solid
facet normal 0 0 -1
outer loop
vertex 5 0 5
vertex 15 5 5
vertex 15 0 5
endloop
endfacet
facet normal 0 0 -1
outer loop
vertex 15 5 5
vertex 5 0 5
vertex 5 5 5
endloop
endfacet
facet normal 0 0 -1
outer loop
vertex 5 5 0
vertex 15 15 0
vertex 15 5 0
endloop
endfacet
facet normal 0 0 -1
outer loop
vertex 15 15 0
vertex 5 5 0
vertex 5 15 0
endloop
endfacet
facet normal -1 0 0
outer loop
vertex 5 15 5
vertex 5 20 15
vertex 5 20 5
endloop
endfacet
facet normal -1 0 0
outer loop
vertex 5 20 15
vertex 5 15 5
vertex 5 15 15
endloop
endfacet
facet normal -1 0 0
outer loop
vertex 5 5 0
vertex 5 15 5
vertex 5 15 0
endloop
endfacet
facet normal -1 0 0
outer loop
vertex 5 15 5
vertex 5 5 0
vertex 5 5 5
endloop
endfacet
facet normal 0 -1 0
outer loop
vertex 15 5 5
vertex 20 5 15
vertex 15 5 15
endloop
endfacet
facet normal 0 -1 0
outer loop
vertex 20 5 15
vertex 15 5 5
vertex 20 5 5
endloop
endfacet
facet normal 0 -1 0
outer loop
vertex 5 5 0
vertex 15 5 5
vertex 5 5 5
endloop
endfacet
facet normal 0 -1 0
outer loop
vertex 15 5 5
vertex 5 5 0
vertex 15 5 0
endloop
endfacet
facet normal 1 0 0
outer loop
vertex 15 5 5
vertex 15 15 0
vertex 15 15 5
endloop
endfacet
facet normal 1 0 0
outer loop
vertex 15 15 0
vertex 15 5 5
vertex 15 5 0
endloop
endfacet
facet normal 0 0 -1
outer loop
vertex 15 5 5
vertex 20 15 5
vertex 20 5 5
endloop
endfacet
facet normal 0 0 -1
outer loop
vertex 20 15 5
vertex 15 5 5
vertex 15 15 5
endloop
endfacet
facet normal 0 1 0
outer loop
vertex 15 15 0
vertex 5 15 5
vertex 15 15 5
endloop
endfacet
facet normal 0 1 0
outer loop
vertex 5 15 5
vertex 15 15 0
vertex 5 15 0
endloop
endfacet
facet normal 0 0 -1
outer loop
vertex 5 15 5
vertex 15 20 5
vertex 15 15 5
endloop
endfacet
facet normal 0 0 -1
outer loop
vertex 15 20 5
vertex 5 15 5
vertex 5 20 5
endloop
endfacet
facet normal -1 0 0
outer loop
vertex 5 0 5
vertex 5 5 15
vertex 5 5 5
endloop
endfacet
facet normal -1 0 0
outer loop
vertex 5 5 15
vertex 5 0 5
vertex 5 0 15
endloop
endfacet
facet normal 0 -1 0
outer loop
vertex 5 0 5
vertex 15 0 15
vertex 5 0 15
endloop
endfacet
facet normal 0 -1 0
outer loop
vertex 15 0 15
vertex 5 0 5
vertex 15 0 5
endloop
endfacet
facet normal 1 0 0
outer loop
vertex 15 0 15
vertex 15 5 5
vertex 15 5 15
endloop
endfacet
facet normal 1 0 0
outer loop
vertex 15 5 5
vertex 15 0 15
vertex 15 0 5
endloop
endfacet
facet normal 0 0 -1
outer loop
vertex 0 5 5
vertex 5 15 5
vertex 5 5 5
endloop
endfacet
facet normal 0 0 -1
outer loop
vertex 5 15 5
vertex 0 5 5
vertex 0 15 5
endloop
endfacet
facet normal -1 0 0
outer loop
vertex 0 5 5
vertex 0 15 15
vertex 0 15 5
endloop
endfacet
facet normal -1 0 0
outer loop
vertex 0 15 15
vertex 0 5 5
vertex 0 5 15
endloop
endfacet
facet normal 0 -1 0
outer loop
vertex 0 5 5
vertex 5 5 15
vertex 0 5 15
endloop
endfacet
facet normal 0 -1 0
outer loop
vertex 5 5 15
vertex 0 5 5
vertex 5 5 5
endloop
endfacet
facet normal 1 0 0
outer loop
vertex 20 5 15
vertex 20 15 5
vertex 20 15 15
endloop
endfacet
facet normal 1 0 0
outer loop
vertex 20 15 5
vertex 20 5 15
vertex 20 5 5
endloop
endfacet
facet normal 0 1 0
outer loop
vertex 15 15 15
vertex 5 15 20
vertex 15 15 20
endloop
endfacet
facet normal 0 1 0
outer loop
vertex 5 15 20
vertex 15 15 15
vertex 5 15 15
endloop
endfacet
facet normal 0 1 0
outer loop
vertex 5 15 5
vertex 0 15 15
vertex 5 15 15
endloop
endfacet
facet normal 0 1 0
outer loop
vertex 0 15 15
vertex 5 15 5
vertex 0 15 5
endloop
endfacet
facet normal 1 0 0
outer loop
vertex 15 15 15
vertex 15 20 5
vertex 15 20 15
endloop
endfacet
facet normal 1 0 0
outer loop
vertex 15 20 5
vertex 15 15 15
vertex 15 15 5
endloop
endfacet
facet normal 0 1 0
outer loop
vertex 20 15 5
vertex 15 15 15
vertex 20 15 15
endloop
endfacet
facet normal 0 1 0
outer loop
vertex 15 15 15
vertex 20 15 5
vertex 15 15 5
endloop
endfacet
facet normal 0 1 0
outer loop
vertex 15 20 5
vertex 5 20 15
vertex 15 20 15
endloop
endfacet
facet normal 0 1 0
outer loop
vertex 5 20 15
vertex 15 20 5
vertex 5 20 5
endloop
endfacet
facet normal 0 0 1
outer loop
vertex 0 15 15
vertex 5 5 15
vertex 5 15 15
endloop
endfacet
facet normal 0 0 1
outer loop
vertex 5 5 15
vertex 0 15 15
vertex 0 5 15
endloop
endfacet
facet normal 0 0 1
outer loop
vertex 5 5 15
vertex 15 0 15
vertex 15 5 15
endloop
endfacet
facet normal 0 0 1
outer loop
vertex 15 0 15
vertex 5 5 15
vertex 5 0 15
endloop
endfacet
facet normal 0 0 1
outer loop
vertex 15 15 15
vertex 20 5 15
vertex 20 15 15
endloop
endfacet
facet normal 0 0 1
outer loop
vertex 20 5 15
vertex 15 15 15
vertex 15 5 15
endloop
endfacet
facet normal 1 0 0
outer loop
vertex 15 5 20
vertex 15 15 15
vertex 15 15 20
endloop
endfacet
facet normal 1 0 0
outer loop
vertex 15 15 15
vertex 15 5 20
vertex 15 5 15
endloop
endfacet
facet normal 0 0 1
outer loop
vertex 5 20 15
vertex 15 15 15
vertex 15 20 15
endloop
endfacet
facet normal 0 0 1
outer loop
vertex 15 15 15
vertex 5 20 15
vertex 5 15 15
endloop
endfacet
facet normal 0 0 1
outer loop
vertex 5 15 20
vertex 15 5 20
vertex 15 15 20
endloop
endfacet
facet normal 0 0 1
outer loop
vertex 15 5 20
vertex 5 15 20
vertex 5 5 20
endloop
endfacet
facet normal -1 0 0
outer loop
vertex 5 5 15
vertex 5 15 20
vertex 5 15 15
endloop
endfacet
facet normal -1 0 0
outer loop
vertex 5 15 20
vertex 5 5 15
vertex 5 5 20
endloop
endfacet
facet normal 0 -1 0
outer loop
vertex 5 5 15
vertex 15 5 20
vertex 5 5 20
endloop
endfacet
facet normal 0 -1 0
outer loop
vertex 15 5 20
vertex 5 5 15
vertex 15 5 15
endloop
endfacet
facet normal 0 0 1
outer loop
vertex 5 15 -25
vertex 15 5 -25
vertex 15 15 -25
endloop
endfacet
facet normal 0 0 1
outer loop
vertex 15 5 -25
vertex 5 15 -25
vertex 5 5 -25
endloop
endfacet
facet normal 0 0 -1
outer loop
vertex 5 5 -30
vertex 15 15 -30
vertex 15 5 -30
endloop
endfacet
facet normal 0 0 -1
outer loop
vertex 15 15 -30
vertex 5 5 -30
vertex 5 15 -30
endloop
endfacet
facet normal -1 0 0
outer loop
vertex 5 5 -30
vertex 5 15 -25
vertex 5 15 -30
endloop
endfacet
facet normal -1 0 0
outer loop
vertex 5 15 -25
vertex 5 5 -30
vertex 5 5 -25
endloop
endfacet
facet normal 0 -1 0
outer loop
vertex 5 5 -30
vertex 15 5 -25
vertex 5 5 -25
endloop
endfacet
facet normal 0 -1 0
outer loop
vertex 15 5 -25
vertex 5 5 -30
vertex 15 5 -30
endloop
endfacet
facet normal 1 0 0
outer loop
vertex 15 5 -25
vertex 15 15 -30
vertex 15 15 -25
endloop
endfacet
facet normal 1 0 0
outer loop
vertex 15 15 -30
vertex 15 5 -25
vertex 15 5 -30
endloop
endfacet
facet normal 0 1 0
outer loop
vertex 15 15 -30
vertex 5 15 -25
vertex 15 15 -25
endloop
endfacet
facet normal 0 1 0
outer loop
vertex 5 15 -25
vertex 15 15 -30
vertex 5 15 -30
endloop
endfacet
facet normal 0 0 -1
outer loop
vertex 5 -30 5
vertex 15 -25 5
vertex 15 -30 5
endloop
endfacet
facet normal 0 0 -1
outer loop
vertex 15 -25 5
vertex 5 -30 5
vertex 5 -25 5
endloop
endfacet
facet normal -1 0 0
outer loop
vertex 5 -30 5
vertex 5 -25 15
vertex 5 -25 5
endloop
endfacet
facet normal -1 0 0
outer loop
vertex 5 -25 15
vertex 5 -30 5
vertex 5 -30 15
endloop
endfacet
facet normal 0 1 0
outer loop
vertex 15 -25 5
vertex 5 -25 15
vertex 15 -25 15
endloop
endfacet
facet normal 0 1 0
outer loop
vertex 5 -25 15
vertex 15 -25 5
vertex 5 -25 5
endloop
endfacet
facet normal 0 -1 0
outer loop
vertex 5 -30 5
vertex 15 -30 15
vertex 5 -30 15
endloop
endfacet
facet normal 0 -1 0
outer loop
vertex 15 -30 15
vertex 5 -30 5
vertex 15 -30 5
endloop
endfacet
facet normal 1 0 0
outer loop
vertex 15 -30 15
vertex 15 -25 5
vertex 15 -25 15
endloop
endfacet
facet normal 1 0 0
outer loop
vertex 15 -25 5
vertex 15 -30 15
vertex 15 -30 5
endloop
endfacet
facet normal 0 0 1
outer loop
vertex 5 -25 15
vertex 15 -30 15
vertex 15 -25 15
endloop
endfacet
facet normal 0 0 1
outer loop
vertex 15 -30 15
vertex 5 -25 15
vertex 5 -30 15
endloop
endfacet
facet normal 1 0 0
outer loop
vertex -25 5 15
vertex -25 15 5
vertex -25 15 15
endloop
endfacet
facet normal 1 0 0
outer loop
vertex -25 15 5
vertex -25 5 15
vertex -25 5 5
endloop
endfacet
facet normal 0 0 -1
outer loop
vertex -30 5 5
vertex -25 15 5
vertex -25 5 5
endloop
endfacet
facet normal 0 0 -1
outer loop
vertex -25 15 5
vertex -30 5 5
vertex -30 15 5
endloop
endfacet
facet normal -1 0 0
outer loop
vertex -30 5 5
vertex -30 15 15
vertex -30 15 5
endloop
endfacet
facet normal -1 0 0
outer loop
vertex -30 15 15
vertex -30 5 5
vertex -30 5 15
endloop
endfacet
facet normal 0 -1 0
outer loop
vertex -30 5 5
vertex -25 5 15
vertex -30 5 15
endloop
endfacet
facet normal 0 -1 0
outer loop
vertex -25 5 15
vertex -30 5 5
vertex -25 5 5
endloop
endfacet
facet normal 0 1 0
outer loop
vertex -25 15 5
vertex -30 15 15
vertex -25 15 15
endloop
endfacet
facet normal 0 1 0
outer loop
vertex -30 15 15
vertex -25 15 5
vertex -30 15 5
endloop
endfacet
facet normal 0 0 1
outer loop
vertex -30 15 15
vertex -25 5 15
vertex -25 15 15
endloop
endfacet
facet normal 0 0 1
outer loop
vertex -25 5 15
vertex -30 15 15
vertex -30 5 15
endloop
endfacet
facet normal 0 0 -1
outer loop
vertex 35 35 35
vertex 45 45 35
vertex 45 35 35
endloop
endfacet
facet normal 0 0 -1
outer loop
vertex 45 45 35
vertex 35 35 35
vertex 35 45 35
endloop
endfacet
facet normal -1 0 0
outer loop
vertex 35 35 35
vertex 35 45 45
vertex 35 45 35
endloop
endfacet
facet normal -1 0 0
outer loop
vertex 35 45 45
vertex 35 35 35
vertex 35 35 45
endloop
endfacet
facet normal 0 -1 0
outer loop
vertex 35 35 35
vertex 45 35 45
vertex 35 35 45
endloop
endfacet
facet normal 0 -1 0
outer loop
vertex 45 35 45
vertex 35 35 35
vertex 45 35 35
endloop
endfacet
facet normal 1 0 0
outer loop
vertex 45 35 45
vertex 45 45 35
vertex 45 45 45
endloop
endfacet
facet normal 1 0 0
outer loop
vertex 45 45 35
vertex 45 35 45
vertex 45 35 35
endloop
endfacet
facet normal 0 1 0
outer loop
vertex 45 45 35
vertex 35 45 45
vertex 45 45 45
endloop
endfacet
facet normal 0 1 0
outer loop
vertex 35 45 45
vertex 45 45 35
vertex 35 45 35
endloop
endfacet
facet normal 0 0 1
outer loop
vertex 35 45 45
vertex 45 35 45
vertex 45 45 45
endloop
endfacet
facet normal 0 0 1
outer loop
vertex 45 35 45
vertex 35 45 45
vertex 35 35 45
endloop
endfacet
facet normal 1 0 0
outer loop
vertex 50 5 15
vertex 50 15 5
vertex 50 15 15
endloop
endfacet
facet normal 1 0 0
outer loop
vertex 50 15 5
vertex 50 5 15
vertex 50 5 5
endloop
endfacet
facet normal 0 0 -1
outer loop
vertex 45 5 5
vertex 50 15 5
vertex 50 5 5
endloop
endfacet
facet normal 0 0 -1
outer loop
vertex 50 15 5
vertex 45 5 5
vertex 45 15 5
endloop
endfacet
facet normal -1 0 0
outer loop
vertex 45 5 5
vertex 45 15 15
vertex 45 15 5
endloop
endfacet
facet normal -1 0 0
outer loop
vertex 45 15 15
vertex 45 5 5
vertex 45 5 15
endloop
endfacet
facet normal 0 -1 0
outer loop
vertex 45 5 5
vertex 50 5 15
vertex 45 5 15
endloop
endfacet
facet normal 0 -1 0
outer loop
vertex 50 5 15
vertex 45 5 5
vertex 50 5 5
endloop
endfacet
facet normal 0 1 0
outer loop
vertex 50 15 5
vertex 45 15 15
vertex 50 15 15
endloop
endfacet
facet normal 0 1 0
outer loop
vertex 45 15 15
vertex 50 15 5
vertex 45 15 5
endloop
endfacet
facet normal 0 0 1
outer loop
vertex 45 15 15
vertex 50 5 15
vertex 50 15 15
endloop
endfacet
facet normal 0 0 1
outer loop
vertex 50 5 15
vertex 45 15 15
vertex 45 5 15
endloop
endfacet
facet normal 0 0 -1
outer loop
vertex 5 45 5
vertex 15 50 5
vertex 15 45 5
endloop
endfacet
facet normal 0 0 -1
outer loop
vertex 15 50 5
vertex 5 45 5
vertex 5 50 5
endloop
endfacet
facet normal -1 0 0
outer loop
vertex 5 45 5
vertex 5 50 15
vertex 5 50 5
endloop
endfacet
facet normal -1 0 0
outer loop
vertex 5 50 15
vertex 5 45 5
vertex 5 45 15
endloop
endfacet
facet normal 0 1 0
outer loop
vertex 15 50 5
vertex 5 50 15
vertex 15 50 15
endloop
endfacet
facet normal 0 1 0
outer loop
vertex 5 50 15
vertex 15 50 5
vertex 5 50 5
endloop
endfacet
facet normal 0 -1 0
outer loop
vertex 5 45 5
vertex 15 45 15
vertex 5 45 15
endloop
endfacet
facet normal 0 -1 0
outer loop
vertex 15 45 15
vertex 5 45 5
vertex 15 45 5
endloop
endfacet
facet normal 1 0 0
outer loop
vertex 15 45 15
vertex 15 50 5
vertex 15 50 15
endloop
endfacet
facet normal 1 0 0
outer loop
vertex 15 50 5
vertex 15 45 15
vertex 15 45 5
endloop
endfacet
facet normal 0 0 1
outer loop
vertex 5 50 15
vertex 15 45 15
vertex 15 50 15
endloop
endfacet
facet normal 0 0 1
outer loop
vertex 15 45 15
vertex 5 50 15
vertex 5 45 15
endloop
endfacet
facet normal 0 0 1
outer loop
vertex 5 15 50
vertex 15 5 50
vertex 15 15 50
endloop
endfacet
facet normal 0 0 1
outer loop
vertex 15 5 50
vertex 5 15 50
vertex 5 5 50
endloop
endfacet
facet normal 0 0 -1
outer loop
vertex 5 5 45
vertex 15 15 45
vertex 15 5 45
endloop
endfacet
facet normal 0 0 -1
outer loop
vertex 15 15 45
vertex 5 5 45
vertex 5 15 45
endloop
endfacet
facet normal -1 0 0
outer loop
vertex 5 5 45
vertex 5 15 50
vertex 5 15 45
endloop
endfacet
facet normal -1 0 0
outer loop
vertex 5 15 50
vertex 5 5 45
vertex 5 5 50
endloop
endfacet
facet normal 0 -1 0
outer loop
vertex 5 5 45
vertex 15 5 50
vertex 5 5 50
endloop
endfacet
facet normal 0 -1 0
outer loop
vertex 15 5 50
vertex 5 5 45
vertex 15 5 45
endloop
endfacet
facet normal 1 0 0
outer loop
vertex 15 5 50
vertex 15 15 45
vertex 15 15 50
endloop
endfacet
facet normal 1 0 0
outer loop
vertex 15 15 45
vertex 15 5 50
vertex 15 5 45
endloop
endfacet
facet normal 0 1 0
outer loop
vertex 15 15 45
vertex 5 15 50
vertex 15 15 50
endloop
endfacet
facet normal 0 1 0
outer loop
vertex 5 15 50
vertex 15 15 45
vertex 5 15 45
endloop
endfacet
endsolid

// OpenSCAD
// SCAD file for Six Piece Burr Puzzle
// 整体模型
union() {
  translate([5, 5, 0]) color([1, 0.8, 0, 0.85]) cube([5, 5, 5]);
  translate([10, 5, 0]) color([1, 0.8, 0, 0.85]) cube([5, 5, 5]);
  translate([5, 10, 0]) color([1, 0.8, 0, 0.85]) cube([5, 5, 5]);
  translate([10, 10, 0]) color([1, 0.8, 0, 0.85]) cube([5, 5, 5]);
  translate([5, 0, 5]) color([0, 0.8, 0, 0.85]) cube([5, 5, 5]);
  translate([10, 0, 5]) color([0, 0.8, 0, 0.85]) cube([5, 5, 5]);
  translate([0, 5, 5]) color([0.6, 0, 1, 0.85]) cube([5, 5, 5]);
  translate([5, 5, 5]) color([0.8, 0.8, 0.8, 0.85]) cube([5, 5, 5]);
  translate([10, 5, 5]) color([0.8, 0.8, 0.8, 0.85]) cube([5, 5, 5]);
  translate([15, 5, 5]) color([1, 0.4, 0, 0.85]) cube([5, 5, 5]);
  translate([0, 10, 5]) color([0.6, 0, 1, 0.85]) cube([5, 5, 5]);
  translate([5, 10, 5]) color([0.8, 0.8, 0.8, 0.85]) cube([5, 5, 5]);
  translate([10, 10, 5]) color([0.8, 0.8, 0.8, 0.85]) cube([5, 5, 5]);
  translate([15, 10, 5]) color([1, 0.4, 0, 0.85]) cube([5, 5, 5]);
  translate([5, 15, 5]) color([1, 0, 0, 0.85]) cube([5, 5, 5]);
  translate([10, 15, 5]) color([1, 0, 0, 0.85]) cube([5, 5, 5]);
  translate([5, 0, 10]) color([0, 0.8, 0, 0.85]) cube([5, 5, 5]);
  translate([10, 0, 10]) color([0, 0.8, 0, 0.85]) cube([5, 5, 5]);
  translate([0, 5, 10]) color([0.6, 0, 1, 0.85]) cube([5, 5, 5]);
  translate([5, 5, 10]) color([0.8, 0.8, 0.8, 0.85]) cube([5, 5, 5]);
  translate([10, 5, 10]) color([0.8, 0.8, 0.8, 0.85]) cube([5, 5, 5]);
  translate([15, 5, 10]) color([1, 0.4, 0, 0.85]) cube([5, 5, 5]);
  translate([0, 10, 10]) color([0.6, 0, 1, 0.85]) cube([5, 5, 5]);
  translate([5, 10, 10]) color([0.8, 0.8, 0.8, 0.85]) cube([5, 5, 5]);
  translate([10, 10, 10]) color([0.8, 0.8, 0.8, 0.85]) cube([5, 5, 5]);
  translate([15, 10, 10]) color([1, 0.4, 0, 0.85]) cube([5, 5, 5]);
  translate([5, 15, 10]) color([1, 0, 0, 0.85]) cube([5, 5, 5]);
  translate([10, 15, 10]) color([1, 0, 0, 0.85]) cube([5, 5, 5]);
  translate([5, 5, 15]) color([0, 0.4, 1, 0.85]) cube([5, 5, 5]);
  translate([10, 5, 15]) color([0, 0.4, 1, 0.85]) cube([5, 5, 5]);
  translate([5, 10, 15]) color([0, 0.4, 1, 0.85]) cube([5, 5, 5]);
  translate([10, 10, 15]) color([0, 0.4, 1, 0.85]) cube([5, 5, 5]);
}

// 零件 D
union() {
  translate([5.0, 5.0, -30.0]) color([1, 0.8, 0, 0.85]) cube([5, 5, 5]);
  translate([10.0, 5.0, -30.0]) color([1, 0.8, 0, 0.85]) cube([5, 5, 5]);
  translate([5.0, 10.0, -30.0]) color([1, 0.8, 0, 0.85]) cube([5, 5, 5]);
  translate([10.0, 10.0, -30.0]) color([1, 0.8, 0, 0.85]) cube([5, 5, 5]);
}

// 零件 B
union() {
  translate([5.0, -30.0, 5.0]) color([0, 0.8, 0, 0.85]) cube([5, 5, 5]);
  translate([10.0, -30.0, 5.0]) color([0, 0.8, 0, 0.85]) cube([5, 5, 5]);
  translate([5.0, -30.0, 10.0]) color([0, 0.8, 0, 0.85]) cube([5, 5, 5]);
  translate([10.0, -30.0, 10.0]) color([0, 0.8, 0, 0.85]) cube([5, 5, 5]);
}

// 零件 F
union() {
  translate([-30.0, 5.0, 5.0]) color([0.6, 0, 1, 0.85]) cube([5, 5, 5]);
  translate([-30.0, 10.0, 5.0]) color([0.6, 0, 1, 0.85]) cube([5, 5, 5]);
  translate([-30.0, 5.0, 10.0]) color([0.6, 0, 1, 0.85]) cube([5, 5, 5]);
  translate([-30.0, 10.0, 10.0]) color([0.6, 0, 1, 0.85]) cube([5, 5, 5]);
}

// 零件 public
union() {
  translate([35.0, 35.0, 35.0]) color([0.8, 0.8, 0.8, 0.85]) cube([5, 5, 5]);
  translate([40.0, 35.0, 35.0]) color([0.8, 0.8, 0.8, 0.85]) cube([5, 5, 5]);
  translate([35.0, 40.0, 35.0]) color([0.8, 0.8, 0.8, 0.85]) cube([5, 5, 5]);
  translate([40.0, 40.0, 35.0]) color([0.8, 0.8, 0.8, 0.85]) cube([5, 5, 5]);
  translate([35.0, 35.0, 40.0]) color([0.8, 0.8, 0.8, 0.85]) cube([5, 5, 5]);
  translate([40.0, 35.0, 40.0]) color([0.8, 0.8, 0.8, 0.85]) cube([5, 5, 5]);
  translate([35.0, 40.0, 40.0]) color([0.8, 0.8, 0.8, 0.85]) cube([5, 5, 5]);
  translate([40.0, 40.0, 40.0]) color([0.8, 0.8, 0.8, 0.85]) cube([5, 5, 5]);
}

// 零件 E
union() {
  translate([45.0, 5.0, 5.0]) color([1, 0.4, 0, 0.85]) cube([5, 5, 5]);
  translate([45.0, 10.0, 5.0]) color([1, 0.4, 0, 0.85]) cube([5, 5, 5]);
  translate([45.0, 5.0, 10.0]) color([1, 0.4, 0, 0.85]) cube([5, 5, 5]);
  translate([45.0, 10.0, 10.0]) color([1, 0.4, 0, 0.85]) cube([5, 5, 5]);
}

// 零件 A
union() {
  translate([5.0, 45.0, 5.0]) color([1, 0, 0, 0.85]) cube([5, 5, 5]);
  translate([10.0, 45.0, 5.0]) color([1, 0, 0, 0.85]) cube([5, 5, 5]);
  translate([5.0, 45.0, 10.0]) color([1, 0, 0, 0.85]) cube([5, 5, 5]);
  translate([10.0, 45.0, 10.0]) color([1, 0, 0, 0.85]) cube([5, 5, 5]);
}

// 零件 C
union() {
  translate([5.0, 5.0, 45.0]) color([0, 0.4, 1, 0.85]) cube([5, 5, 5]);
  translate([10.0, 5.0, 45.0]) color([0, 0.4, 1, 0.85]) cube([5, 5, 5]);
  translate([5.0, 10.0, 45.0]) color([0, 0.4, 1, 0.85]) cube([5, 5, 5]);
  translate([10.0, 10.0, 45.0]) color([0, 0.4, 1, 0.85]) cube([5, 5, 5]);
}
